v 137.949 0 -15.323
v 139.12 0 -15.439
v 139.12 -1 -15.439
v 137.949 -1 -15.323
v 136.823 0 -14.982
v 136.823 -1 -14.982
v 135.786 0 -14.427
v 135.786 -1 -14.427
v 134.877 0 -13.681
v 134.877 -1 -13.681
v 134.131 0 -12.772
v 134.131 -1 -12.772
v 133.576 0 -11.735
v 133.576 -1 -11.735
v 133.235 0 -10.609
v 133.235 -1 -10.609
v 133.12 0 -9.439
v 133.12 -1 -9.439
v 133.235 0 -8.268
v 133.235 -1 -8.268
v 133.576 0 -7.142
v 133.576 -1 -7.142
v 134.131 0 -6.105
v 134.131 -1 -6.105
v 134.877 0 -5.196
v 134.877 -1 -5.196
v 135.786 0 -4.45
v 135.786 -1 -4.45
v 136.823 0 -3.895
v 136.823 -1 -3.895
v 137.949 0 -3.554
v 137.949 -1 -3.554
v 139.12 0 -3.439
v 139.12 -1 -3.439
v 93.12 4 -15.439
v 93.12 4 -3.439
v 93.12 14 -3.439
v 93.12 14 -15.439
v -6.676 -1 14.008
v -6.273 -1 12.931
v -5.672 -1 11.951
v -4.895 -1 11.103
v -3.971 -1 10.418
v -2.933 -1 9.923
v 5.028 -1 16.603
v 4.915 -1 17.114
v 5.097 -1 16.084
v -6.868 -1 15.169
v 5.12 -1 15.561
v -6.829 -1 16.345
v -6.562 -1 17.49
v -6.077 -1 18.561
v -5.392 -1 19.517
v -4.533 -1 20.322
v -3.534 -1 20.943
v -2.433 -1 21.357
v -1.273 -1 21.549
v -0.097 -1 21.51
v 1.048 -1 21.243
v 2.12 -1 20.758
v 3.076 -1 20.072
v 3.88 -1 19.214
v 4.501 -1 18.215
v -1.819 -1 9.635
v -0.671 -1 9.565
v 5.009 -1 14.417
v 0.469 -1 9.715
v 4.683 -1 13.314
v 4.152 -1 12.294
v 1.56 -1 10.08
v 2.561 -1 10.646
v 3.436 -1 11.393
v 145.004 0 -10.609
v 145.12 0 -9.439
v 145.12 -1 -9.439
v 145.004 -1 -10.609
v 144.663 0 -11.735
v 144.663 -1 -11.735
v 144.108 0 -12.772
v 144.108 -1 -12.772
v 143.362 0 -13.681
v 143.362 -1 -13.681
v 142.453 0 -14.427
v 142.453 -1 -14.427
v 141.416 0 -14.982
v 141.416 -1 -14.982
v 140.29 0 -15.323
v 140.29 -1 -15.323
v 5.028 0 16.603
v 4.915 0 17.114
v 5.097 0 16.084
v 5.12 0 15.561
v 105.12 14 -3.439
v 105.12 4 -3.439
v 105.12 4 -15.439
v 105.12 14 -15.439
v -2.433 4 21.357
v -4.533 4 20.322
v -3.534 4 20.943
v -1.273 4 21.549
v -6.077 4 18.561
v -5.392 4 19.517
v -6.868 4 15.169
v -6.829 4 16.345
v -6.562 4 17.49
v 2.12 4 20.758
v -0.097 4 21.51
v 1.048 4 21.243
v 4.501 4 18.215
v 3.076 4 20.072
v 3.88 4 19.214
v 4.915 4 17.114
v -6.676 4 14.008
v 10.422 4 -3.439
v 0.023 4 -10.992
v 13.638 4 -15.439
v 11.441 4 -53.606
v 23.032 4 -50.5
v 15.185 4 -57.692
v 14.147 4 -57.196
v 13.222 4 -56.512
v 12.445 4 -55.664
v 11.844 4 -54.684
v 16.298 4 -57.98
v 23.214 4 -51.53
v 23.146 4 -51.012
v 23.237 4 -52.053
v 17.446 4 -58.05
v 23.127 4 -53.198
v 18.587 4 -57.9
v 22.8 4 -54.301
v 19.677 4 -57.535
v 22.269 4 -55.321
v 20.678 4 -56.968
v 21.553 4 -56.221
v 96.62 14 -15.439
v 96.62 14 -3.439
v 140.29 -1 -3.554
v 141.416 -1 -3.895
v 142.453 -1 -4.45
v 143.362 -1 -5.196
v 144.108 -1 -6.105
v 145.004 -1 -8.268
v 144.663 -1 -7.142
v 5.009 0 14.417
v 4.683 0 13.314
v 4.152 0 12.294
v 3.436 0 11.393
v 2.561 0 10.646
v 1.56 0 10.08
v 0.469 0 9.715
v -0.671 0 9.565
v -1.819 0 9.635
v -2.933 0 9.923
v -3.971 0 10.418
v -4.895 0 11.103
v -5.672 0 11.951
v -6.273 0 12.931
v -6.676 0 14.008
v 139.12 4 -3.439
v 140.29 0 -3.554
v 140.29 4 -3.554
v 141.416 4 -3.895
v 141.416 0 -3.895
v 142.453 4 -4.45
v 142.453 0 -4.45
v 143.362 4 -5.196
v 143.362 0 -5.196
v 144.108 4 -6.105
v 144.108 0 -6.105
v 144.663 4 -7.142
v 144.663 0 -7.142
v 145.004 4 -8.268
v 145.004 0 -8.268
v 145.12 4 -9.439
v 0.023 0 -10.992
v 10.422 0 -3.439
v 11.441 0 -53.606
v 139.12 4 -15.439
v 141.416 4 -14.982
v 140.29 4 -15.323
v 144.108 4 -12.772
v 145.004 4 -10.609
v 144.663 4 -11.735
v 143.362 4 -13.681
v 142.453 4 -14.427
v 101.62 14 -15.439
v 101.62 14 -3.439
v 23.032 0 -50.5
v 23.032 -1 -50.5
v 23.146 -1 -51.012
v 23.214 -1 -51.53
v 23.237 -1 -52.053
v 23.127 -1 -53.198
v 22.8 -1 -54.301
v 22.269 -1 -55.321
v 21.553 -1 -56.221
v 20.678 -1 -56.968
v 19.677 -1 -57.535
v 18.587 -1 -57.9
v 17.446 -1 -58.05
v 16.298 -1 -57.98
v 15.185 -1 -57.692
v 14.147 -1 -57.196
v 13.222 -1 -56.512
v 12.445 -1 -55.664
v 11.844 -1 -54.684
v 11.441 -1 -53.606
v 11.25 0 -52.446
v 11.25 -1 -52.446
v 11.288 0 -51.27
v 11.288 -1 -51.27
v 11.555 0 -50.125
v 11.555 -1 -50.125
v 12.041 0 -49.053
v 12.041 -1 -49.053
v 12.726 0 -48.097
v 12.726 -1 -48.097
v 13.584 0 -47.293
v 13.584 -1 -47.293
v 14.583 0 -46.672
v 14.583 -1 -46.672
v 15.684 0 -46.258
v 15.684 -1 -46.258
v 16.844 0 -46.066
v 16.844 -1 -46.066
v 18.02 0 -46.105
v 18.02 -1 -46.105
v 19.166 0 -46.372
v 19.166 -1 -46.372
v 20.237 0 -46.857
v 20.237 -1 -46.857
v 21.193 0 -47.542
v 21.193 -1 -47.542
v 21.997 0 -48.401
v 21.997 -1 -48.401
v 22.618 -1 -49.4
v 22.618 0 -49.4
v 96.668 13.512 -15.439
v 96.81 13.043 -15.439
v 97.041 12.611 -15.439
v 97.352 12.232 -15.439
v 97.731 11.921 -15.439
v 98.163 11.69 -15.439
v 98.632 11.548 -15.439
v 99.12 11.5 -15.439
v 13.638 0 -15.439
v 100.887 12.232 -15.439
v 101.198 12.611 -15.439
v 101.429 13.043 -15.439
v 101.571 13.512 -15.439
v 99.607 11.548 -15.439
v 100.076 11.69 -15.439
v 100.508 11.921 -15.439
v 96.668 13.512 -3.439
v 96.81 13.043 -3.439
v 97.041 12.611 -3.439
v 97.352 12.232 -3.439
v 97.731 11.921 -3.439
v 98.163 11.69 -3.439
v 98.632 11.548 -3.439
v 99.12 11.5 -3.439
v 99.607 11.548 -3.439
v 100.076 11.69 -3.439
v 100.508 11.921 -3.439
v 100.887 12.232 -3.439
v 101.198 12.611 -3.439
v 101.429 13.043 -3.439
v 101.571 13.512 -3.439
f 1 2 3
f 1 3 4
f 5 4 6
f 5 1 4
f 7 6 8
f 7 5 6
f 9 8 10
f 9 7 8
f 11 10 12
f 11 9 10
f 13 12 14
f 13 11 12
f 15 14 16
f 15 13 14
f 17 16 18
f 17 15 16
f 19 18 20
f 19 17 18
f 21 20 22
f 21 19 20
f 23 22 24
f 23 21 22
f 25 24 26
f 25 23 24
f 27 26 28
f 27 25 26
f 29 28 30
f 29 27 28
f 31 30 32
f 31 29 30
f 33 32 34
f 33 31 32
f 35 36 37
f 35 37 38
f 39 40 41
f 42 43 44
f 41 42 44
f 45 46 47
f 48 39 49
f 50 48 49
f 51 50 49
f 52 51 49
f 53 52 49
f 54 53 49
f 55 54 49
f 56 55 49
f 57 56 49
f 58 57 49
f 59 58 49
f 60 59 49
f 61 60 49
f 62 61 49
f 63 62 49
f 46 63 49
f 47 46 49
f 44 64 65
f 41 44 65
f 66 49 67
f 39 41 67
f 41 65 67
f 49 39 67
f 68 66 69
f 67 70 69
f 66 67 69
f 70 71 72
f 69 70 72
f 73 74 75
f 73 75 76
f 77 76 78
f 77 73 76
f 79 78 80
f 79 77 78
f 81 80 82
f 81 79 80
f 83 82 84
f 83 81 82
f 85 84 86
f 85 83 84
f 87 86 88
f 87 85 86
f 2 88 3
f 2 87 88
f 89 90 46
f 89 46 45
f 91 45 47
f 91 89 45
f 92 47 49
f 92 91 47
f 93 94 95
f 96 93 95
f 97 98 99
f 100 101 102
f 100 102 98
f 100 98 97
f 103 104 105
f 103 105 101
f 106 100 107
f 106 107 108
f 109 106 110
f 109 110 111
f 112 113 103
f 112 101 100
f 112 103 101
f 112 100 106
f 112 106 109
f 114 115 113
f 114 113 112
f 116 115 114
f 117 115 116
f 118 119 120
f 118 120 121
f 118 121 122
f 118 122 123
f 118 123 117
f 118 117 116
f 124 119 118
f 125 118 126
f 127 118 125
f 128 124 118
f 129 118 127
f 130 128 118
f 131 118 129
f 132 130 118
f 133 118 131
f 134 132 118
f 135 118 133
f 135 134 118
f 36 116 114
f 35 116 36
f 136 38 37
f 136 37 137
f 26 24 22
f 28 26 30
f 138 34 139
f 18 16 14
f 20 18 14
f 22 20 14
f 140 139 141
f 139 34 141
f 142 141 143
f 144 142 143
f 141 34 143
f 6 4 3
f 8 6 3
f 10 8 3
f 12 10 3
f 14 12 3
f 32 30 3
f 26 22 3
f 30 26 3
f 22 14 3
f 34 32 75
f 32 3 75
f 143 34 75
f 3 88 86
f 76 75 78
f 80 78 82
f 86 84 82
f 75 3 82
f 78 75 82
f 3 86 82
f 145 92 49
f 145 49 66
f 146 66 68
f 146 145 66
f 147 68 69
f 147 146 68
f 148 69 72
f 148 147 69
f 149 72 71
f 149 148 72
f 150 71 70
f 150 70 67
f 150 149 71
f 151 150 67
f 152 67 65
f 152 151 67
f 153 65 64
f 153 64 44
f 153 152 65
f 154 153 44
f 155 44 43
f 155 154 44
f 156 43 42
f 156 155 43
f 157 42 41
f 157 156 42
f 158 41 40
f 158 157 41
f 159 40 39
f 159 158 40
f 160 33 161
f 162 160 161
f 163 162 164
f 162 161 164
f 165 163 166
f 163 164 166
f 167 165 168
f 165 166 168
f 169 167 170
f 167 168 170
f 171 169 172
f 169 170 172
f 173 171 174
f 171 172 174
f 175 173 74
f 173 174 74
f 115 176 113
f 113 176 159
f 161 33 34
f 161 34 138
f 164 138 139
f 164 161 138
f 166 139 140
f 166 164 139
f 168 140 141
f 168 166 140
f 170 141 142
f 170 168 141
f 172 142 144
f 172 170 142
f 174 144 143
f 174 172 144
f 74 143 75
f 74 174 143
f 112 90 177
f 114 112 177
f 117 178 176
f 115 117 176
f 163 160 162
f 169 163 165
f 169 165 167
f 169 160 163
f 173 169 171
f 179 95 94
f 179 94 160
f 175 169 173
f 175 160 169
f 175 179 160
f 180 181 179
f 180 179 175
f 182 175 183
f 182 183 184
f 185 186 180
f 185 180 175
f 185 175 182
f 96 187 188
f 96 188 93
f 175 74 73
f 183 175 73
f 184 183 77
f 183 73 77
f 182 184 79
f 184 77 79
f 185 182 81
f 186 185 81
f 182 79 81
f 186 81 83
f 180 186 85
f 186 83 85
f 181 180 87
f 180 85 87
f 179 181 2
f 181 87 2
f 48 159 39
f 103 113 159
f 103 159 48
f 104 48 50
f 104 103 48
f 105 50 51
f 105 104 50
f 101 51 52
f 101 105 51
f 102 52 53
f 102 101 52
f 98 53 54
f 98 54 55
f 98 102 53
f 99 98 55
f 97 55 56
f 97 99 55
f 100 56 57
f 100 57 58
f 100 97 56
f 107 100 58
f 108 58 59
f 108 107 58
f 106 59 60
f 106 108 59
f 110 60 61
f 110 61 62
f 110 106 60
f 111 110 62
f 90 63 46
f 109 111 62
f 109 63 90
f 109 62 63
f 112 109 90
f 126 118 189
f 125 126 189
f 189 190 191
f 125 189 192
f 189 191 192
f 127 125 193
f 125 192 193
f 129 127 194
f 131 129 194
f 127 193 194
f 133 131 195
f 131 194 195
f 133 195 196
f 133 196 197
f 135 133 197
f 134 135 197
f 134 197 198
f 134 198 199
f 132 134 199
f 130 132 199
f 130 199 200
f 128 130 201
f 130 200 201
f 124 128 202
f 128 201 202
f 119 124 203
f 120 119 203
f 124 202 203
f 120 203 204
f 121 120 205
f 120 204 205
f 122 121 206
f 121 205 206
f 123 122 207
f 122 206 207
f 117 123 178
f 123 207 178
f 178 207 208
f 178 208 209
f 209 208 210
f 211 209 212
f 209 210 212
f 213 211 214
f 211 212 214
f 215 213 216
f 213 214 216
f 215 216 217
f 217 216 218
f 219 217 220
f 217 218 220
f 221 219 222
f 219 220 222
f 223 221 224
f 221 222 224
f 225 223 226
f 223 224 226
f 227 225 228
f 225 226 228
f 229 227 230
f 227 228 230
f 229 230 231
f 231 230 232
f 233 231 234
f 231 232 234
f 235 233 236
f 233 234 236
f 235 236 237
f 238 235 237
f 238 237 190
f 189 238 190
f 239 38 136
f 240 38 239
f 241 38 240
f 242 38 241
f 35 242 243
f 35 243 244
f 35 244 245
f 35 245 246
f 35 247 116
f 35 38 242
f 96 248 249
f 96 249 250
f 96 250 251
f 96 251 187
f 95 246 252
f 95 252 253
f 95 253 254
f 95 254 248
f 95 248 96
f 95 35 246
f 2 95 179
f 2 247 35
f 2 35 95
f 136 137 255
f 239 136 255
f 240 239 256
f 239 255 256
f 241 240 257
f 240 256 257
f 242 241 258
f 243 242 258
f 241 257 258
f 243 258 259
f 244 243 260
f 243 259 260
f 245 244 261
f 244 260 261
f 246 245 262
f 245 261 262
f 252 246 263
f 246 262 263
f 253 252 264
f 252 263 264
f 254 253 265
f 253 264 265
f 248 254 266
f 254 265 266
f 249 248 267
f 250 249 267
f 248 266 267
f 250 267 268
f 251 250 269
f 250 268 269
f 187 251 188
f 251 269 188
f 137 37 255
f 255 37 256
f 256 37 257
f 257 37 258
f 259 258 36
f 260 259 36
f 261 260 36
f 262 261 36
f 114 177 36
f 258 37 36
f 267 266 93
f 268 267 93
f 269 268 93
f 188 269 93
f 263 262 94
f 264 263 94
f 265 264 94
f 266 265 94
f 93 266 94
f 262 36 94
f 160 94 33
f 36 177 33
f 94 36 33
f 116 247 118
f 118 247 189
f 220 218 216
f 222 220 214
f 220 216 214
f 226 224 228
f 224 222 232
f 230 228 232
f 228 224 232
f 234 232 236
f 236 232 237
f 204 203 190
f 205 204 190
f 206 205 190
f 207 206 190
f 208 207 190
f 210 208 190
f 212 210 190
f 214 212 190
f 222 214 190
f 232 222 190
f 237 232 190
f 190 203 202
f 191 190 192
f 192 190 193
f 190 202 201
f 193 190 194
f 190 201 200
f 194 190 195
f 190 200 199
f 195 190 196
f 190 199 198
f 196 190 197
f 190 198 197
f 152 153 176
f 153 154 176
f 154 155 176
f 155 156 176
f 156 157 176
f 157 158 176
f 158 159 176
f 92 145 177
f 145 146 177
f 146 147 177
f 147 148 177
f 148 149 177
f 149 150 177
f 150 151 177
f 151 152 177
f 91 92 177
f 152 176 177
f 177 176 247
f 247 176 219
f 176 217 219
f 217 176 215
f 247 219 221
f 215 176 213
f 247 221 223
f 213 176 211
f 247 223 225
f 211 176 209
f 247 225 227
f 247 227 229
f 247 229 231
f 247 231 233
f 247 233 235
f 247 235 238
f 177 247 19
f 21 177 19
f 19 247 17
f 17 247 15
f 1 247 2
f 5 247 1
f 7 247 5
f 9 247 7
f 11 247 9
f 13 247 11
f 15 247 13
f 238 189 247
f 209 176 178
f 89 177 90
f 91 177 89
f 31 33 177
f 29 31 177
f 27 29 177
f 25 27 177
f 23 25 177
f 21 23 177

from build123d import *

# Parameters (mm, degrees)
BOSS_EXTRUDE3_DEPTH      = 4
BOSS_EXTRUDE3_2_DEPTH    = 4
BOSS_EXTRUDE4_DEPTH      = 4
BOSS_EXTRUDE4_DEPTH_BACK = 1
SKETCH2_5_R              = 6
SKETCH2_6_W              = 12
SKETCH2_6_H              = 12
BOSS_EXTRUDE5_DEPTH      = 14
SKETCH3_R                = 2.5
CUT_EXTRUDE1_DEPTH       = 14


with BuildPart() as part:
    # Sketch2 → Boss-Extrude3 (new body)
    with BuildSketch(Plane(origin=(0, 0, 0), x_dir=(1, 0, 0), z_dir=(0, 1, 0))):
        with BuildLine():
            ThreePointArc((-6.676022794, -14.008494556), (0.672446434, -9.765853869), (4.915087121, -17.114323097))
            Line((4.915087121, -17.114323097), (10.422223902, 3.438591174))
            Line((10.422223902, 3.438591174), (93.119532163, 3.438591174))
            Line((93.119532163, 3.438591174), (93.119532163, 15.438591174))
            Line((93.119532163, 15.438591174), (13.637614211, 15.438591174))
            Line((13.637614211, 15.438591174), (23.032420278, 50.500484743))
            ThreePointArc((23.032420278, 50.500484743), (15.68395105, 46.257844056), (11.441310363, 53.606313284))
            Line((11.441310363, 53.606313284), (-6.676022794, -14.008494556))
        make_face()
    extrude(amount=BOSS_EXTRUDE3_DEPTH)



with BuildPart() as body_2:
    # Sketch2 → Boss-Extrude3 2 (new body)
    with BuildSketch(Plane(origin=(0, 0, 0), x_dir=(1, 0, 0), z_dir=(0, 1, 0))):
        with BuildLine():
            Line((105.119532163, 15.438591174), (105.119532163, 3.438591174))
            Line((105.119532163, 3.438591174), (139.119532163, 3.438591174))
            ThreePointArc((139.119532163, 3.438591174), (133.119532163, 9.438591174), (139.119532163, 15.438591174))
            Line((139.119532163, 15.438591174), (105.119532163, 15.438591174))
        make_face()
    extrude(amount=BOSS_EXTRUDE3_2_DEPTH)


with BuildPart() as part_1:
    add(part.part)

    add(body_2.part)  # Boss-Extrude4 merges body 2
    # Sketch2<5> → Boss-Extrude4 (add, two sides: drawn at the far end of the back side and taken through both)
    with BuildSketch(Plane(origin=(0, 0, 0), x_dir=(1, 0, 0), z_dir=(0, 1, 0)).offset(-BOSS_EXTRUDE4_DEPTH_BACK)):
        with Locations((-0.880467837, -15.561408826)):
            Circle(SKETCH2_5_R)
        with Locations((17.236865321, 52.053399014)):
            Circle(SKETCH2_5_R)
        with Locations((139.119532163, 9.438591174)):
            Circle(SKETCH2_5_R)
    extrude(amount=BOSS_EXTRUDE4_DEPTH + BOSS_EXTRUDE4_DEPTH_BACK)

    # Sketch2<6> → Boss-Extrude5 (add)
    with BuildSketch(Plane(origin=(0, 0, 0), x_dir=(1, 0, 0), z_dir=(0, 1, 0))):
        with Locations((99.119532163, 9.438591174)):
            Rectangle(SKETCH2_6_W, SKETCH2_6_H)
    extrude(amount=BOSS_EXTRUDE5_DEPTH)

    # Sketch3 → Cut-Extrude1 (cut)
    with BuildSketch(Plane.XY.offset(-3.438591174)):
        with Locations((99.119532163, 14)):
            Circle(SKETCH3_R)
    extrude(amount=-CUT_EXTRUDE1_DEPTH, mode=Mode.SUBTRACT)


solid = part_1.part
